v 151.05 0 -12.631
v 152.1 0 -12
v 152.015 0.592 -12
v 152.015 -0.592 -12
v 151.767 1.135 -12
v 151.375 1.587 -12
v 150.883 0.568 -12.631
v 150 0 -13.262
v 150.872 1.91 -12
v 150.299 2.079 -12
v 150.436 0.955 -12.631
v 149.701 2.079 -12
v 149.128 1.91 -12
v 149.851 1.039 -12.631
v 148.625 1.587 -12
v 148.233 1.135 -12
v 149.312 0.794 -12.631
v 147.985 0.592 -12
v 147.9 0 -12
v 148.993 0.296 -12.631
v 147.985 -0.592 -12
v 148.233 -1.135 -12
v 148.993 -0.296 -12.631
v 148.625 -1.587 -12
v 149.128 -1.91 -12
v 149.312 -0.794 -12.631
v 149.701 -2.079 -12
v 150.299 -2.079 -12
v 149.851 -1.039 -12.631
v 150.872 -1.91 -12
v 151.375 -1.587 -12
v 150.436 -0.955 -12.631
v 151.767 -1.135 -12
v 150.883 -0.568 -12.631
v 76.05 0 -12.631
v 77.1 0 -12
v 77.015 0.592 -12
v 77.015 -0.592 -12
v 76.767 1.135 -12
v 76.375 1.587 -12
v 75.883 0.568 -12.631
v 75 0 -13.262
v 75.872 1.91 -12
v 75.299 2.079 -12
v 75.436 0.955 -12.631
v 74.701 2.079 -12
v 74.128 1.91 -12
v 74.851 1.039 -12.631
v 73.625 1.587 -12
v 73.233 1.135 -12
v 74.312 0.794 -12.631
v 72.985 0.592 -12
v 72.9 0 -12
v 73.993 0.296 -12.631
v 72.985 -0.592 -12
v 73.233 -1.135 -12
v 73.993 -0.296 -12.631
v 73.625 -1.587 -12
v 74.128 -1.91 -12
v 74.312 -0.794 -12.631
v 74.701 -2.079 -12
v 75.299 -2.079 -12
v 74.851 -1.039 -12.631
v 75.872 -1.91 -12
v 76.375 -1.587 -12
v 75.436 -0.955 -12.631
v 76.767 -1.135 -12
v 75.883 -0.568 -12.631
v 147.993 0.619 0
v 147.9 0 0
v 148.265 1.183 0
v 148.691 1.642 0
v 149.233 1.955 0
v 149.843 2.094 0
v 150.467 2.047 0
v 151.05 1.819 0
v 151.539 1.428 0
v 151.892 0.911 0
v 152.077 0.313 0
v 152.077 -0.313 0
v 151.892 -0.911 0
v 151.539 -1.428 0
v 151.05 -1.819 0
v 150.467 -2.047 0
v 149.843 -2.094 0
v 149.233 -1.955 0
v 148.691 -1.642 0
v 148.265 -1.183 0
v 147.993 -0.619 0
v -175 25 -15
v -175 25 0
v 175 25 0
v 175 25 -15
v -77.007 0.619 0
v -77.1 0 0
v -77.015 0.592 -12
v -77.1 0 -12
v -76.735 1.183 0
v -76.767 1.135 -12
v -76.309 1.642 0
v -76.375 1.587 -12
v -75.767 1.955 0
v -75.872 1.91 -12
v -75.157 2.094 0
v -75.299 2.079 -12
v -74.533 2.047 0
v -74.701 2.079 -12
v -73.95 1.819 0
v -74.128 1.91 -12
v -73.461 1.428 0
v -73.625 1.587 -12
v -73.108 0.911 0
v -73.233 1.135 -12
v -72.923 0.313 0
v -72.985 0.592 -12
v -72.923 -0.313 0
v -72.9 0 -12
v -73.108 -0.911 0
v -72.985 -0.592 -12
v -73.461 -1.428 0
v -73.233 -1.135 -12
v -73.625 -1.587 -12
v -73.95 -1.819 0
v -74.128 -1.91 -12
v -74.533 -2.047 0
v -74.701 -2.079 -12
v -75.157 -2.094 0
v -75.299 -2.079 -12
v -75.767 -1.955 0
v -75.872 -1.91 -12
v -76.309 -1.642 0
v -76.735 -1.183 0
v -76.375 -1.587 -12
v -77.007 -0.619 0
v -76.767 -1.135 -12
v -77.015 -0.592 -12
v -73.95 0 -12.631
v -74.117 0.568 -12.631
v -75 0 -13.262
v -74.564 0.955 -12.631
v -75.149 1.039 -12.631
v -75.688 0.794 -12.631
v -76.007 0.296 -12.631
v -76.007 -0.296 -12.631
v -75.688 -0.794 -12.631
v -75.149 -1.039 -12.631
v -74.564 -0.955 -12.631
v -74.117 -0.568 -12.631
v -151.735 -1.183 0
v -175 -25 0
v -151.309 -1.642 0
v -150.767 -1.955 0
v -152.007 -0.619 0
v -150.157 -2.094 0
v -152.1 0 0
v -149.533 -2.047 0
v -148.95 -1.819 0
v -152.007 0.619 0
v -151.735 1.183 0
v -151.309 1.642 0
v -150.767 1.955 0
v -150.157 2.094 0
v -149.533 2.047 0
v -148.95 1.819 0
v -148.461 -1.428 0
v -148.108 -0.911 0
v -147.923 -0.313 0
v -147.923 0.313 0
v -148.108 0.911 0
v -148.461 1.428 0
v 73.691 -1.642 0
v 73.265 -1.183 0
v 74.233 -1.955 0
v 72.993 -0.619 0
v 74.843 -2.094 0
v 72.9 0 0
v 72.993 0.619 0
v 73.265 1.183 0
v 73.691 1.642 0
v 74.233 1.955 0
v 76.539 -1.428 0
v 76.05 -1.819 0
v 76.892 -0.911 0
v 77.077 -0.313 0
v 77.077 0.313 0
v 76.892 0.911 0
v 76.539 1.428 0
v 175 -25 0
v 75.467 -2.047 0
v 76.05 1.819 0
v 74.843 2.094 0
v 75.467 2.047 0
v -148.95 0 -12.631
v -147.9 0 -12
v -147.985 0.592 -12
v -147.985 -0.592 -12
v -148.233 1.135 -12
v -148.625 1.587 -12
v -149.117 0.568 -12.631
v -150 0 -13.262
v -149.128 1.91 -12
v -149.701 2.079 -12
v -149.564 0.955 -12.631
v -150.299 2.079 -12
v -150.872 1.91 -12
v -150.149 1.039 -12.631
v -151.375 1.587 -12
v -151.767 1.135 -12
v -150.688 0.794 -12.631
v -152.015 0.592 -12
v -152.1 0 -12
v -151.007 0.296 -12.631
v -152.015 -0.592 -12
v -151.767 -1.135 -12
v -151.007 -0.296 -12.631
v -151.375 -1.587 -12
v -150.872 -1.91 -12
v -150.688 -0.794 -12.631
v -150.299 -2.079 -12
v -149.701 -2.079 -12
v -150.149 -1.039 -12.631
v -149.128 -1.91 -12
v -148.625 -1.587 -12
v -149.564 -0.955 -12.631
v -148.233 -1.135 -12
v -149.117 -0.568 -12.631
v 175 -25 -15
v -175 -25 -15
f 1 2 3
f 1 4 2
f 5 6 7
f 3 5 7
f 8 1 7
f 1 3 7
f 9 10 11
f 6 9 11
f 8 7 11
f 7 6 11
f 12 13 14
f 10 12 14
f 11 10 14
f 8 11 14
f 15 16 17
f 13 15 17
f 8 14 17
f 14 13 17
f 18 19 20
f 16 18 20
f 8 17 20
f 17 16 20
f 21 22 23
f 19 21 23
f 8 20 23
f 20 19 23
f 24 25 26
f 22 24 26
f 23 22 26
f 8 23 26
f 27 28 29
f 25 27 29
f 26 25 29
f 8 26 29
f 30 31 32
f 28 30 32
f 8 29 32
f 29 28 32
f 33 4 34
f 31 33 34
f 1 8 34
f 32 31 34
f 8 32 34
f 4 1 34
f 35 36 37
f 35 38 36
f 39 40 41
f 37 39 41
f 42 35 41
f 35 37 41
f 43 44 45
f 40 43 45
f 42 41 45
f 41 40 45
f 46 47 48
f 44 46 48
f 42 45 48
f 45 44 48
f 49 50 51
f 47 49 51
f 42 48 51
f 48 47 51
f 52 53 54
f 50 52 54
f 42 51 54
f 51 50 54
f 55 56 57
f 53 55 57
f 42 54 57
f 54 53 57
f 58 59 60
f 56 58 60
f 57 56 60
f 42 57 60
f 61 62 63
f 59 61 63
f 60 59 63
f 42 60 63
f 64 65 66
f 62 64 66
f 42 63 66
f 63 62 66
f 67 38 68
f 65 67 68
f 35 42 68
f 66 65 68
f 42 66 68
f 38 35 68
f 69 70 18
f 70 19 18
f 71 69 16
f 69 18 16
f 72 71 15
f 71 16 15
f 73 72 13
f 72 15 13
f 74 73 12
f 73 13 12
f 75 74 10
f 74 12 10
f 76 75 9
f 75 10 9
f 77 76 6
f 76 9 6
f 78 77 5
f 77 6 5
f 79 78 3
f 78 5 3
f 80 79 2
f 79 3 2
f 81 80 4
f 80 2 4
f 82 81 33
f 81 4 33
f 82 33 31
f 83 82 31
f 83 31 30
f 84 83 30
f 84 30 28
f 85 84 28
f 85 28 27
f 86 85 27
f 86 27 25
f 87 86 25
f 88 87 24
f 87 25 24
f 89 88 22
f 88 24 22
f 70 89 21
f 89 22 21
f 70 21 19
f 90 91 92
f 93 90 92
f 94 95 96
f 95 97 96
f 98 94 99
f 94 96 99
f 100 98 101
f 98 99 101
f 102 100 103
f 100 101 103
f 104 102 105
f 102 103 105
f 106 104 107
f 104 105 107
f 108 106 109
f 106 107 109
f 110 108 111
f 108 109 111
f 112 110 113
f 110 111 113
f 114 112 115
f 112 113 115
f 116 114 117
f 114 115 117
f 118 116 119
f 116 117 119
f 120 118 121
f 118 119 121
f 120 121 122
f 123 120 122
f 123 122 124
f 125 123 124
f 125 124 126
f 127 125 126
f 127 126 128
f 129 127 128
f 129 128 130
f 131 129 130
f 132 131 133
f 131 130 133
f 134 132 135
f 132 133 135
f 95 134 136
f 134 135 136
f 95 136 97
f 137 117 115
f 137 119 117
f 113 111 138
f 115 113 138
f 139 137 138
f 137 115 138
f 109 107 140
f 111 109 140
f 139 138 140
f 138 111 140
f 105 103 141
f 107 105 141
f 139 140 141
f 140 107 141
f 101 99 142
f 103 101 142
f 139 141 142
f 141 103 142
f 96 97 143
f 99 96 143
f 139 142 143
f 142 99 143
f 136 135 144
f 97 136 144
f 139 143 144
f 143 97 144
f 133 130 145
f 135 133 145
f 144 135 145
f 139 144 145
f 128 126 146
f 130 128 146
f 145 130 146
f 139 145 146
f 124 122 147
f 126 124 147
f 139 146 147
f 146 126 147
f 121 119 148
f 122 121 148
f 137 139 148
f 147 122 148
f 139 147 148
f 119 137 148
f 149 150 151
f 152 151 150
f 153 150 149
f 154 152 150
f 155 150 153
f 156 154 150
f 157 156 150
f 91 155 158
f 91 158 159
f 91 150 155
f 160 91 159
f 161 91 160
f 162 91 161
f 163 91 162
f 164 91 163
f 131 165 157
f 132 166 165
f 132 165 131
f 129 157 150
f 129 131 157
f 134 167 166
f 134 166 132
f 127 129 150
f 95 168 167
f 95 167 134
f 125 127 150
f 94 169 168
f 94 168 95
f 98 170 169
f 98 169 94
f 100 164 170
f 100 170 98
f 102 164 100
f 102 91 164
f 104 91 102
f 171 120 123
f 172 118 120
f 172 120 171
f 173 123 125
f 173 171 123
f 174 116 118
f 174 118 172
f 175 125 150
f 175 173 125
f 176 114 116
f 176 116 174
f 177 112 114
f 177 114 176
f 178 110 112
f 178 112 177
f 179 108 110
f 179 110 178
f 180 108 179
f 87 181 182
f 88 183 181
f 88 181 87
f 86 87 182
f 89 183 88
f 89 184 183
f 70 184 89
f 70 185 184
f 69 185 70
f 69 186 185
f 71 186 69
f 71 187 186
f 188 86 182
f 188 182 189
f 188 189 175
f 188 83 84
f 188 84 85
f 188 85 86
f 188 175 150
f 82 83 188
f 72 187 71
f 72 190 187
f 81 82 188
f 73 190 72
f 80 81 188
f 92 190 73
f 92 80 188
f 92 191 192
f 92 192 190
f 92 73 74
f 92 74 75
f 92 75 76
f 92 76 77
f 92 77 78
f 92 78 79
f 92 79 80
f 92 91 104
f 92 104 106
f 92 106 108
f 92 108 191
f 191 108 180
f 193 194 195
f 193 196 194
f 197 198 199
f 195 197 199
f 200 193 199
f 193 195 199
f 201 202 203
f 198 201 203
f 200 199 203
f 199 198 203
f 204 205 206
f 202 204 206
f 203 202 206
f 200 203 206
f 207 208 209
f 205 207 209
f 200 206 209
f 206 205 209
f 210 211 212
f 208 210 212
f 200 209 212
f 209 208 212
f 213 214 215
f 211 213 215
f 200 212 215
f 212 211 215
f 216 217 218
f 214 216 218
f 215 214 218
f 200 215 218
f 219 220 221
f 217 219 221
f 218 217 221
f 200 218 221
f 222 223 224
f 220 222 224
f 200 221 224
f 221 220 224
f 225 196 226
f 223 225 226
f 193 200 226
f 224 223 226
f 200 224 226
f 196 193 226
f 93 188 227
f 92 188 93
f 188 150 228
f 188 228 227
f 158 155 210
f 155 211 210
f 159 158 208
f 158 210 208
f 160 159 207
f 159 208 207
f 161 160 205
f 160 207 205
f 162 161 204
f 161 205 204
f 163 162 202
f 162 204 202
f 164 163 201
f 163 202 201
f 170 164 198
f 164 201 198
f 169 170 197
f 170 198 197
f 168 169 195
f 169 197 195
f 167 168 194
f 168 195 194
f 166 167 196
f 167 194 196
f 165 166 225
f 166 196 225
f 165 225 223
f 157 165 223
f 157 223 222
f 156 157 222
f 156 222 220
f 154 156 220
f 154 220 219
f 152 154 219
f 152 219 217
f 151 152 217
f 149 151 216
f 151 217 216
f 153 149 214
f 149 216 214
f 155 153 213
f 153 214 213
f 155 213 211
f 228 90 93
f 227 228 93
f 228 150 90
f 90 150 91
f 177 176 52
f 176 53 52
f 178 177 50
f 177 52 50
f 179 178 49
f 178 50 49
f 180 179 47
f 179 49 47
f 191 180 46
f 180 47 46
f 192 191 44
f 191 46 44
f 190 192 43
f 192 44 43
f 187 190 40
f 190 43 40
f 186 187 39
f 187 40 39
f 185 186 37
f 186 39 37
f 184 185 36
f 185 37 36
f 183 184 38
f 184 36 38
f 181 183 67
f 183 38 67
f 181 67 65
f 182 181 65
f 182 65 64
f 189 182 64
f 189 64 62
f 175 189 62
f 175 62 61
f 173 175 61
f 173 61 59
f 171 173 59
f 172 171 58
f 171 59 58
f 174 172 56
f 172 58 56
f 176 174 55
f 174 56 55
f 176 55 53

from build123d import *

# Parameters (mm, degrees)
SKIZZE1_W                       = 350
SKIZZE1_H                       = 50
AUFSATZ_LINEAR_AUSTRAGEN1_DEPTH = 15
M5_GEWINDEBOHRUNG1_D            = 4.2
M5_GEWINDEBOHRUNG1_DEPTH        = 12
M5_GEWINDEBOHRUNG1_TIP          = 1.2618073


with BuildPart() as part:
    # Skizze1 → Aufsatz-Linear austragen1 (new body)
    with BuildSketch(Plane.XY):
        Rectangle(SKIZZE1_W, SKIZZE1_H)
    extrude(amount=-AUFSATZ_LINEAR_AUSTRAGEN1_DEPTH)

    # M5 Gewindebohrung1
    with Locations(Plane(origin=(150, 0, 0), x_dir=(1, 0, 0), z_dir=(0, 0, 1))):
        with Locations((0, 0), (-300, 0), (-225, 0), (-75, 0)):
            Hole(M5_GEWINDEBOHRUNG1_D / 2, depth=M5_GEWINDEBOHRUNG1_DEPTH)
            with Locations((0, 0, -(M5_GEWINDEBOHRUNG1_DEPTH + M5_GEWINDEBOHRUNG1_TIP / 2))):  # 118° drill point
                Cone(0, M5_GEWINDEBOHRUNG1_D / 2, M5_GEWINDEBOHRUNG1_TIP, mode=Mode.SUBTRACT)


solid = part.part
